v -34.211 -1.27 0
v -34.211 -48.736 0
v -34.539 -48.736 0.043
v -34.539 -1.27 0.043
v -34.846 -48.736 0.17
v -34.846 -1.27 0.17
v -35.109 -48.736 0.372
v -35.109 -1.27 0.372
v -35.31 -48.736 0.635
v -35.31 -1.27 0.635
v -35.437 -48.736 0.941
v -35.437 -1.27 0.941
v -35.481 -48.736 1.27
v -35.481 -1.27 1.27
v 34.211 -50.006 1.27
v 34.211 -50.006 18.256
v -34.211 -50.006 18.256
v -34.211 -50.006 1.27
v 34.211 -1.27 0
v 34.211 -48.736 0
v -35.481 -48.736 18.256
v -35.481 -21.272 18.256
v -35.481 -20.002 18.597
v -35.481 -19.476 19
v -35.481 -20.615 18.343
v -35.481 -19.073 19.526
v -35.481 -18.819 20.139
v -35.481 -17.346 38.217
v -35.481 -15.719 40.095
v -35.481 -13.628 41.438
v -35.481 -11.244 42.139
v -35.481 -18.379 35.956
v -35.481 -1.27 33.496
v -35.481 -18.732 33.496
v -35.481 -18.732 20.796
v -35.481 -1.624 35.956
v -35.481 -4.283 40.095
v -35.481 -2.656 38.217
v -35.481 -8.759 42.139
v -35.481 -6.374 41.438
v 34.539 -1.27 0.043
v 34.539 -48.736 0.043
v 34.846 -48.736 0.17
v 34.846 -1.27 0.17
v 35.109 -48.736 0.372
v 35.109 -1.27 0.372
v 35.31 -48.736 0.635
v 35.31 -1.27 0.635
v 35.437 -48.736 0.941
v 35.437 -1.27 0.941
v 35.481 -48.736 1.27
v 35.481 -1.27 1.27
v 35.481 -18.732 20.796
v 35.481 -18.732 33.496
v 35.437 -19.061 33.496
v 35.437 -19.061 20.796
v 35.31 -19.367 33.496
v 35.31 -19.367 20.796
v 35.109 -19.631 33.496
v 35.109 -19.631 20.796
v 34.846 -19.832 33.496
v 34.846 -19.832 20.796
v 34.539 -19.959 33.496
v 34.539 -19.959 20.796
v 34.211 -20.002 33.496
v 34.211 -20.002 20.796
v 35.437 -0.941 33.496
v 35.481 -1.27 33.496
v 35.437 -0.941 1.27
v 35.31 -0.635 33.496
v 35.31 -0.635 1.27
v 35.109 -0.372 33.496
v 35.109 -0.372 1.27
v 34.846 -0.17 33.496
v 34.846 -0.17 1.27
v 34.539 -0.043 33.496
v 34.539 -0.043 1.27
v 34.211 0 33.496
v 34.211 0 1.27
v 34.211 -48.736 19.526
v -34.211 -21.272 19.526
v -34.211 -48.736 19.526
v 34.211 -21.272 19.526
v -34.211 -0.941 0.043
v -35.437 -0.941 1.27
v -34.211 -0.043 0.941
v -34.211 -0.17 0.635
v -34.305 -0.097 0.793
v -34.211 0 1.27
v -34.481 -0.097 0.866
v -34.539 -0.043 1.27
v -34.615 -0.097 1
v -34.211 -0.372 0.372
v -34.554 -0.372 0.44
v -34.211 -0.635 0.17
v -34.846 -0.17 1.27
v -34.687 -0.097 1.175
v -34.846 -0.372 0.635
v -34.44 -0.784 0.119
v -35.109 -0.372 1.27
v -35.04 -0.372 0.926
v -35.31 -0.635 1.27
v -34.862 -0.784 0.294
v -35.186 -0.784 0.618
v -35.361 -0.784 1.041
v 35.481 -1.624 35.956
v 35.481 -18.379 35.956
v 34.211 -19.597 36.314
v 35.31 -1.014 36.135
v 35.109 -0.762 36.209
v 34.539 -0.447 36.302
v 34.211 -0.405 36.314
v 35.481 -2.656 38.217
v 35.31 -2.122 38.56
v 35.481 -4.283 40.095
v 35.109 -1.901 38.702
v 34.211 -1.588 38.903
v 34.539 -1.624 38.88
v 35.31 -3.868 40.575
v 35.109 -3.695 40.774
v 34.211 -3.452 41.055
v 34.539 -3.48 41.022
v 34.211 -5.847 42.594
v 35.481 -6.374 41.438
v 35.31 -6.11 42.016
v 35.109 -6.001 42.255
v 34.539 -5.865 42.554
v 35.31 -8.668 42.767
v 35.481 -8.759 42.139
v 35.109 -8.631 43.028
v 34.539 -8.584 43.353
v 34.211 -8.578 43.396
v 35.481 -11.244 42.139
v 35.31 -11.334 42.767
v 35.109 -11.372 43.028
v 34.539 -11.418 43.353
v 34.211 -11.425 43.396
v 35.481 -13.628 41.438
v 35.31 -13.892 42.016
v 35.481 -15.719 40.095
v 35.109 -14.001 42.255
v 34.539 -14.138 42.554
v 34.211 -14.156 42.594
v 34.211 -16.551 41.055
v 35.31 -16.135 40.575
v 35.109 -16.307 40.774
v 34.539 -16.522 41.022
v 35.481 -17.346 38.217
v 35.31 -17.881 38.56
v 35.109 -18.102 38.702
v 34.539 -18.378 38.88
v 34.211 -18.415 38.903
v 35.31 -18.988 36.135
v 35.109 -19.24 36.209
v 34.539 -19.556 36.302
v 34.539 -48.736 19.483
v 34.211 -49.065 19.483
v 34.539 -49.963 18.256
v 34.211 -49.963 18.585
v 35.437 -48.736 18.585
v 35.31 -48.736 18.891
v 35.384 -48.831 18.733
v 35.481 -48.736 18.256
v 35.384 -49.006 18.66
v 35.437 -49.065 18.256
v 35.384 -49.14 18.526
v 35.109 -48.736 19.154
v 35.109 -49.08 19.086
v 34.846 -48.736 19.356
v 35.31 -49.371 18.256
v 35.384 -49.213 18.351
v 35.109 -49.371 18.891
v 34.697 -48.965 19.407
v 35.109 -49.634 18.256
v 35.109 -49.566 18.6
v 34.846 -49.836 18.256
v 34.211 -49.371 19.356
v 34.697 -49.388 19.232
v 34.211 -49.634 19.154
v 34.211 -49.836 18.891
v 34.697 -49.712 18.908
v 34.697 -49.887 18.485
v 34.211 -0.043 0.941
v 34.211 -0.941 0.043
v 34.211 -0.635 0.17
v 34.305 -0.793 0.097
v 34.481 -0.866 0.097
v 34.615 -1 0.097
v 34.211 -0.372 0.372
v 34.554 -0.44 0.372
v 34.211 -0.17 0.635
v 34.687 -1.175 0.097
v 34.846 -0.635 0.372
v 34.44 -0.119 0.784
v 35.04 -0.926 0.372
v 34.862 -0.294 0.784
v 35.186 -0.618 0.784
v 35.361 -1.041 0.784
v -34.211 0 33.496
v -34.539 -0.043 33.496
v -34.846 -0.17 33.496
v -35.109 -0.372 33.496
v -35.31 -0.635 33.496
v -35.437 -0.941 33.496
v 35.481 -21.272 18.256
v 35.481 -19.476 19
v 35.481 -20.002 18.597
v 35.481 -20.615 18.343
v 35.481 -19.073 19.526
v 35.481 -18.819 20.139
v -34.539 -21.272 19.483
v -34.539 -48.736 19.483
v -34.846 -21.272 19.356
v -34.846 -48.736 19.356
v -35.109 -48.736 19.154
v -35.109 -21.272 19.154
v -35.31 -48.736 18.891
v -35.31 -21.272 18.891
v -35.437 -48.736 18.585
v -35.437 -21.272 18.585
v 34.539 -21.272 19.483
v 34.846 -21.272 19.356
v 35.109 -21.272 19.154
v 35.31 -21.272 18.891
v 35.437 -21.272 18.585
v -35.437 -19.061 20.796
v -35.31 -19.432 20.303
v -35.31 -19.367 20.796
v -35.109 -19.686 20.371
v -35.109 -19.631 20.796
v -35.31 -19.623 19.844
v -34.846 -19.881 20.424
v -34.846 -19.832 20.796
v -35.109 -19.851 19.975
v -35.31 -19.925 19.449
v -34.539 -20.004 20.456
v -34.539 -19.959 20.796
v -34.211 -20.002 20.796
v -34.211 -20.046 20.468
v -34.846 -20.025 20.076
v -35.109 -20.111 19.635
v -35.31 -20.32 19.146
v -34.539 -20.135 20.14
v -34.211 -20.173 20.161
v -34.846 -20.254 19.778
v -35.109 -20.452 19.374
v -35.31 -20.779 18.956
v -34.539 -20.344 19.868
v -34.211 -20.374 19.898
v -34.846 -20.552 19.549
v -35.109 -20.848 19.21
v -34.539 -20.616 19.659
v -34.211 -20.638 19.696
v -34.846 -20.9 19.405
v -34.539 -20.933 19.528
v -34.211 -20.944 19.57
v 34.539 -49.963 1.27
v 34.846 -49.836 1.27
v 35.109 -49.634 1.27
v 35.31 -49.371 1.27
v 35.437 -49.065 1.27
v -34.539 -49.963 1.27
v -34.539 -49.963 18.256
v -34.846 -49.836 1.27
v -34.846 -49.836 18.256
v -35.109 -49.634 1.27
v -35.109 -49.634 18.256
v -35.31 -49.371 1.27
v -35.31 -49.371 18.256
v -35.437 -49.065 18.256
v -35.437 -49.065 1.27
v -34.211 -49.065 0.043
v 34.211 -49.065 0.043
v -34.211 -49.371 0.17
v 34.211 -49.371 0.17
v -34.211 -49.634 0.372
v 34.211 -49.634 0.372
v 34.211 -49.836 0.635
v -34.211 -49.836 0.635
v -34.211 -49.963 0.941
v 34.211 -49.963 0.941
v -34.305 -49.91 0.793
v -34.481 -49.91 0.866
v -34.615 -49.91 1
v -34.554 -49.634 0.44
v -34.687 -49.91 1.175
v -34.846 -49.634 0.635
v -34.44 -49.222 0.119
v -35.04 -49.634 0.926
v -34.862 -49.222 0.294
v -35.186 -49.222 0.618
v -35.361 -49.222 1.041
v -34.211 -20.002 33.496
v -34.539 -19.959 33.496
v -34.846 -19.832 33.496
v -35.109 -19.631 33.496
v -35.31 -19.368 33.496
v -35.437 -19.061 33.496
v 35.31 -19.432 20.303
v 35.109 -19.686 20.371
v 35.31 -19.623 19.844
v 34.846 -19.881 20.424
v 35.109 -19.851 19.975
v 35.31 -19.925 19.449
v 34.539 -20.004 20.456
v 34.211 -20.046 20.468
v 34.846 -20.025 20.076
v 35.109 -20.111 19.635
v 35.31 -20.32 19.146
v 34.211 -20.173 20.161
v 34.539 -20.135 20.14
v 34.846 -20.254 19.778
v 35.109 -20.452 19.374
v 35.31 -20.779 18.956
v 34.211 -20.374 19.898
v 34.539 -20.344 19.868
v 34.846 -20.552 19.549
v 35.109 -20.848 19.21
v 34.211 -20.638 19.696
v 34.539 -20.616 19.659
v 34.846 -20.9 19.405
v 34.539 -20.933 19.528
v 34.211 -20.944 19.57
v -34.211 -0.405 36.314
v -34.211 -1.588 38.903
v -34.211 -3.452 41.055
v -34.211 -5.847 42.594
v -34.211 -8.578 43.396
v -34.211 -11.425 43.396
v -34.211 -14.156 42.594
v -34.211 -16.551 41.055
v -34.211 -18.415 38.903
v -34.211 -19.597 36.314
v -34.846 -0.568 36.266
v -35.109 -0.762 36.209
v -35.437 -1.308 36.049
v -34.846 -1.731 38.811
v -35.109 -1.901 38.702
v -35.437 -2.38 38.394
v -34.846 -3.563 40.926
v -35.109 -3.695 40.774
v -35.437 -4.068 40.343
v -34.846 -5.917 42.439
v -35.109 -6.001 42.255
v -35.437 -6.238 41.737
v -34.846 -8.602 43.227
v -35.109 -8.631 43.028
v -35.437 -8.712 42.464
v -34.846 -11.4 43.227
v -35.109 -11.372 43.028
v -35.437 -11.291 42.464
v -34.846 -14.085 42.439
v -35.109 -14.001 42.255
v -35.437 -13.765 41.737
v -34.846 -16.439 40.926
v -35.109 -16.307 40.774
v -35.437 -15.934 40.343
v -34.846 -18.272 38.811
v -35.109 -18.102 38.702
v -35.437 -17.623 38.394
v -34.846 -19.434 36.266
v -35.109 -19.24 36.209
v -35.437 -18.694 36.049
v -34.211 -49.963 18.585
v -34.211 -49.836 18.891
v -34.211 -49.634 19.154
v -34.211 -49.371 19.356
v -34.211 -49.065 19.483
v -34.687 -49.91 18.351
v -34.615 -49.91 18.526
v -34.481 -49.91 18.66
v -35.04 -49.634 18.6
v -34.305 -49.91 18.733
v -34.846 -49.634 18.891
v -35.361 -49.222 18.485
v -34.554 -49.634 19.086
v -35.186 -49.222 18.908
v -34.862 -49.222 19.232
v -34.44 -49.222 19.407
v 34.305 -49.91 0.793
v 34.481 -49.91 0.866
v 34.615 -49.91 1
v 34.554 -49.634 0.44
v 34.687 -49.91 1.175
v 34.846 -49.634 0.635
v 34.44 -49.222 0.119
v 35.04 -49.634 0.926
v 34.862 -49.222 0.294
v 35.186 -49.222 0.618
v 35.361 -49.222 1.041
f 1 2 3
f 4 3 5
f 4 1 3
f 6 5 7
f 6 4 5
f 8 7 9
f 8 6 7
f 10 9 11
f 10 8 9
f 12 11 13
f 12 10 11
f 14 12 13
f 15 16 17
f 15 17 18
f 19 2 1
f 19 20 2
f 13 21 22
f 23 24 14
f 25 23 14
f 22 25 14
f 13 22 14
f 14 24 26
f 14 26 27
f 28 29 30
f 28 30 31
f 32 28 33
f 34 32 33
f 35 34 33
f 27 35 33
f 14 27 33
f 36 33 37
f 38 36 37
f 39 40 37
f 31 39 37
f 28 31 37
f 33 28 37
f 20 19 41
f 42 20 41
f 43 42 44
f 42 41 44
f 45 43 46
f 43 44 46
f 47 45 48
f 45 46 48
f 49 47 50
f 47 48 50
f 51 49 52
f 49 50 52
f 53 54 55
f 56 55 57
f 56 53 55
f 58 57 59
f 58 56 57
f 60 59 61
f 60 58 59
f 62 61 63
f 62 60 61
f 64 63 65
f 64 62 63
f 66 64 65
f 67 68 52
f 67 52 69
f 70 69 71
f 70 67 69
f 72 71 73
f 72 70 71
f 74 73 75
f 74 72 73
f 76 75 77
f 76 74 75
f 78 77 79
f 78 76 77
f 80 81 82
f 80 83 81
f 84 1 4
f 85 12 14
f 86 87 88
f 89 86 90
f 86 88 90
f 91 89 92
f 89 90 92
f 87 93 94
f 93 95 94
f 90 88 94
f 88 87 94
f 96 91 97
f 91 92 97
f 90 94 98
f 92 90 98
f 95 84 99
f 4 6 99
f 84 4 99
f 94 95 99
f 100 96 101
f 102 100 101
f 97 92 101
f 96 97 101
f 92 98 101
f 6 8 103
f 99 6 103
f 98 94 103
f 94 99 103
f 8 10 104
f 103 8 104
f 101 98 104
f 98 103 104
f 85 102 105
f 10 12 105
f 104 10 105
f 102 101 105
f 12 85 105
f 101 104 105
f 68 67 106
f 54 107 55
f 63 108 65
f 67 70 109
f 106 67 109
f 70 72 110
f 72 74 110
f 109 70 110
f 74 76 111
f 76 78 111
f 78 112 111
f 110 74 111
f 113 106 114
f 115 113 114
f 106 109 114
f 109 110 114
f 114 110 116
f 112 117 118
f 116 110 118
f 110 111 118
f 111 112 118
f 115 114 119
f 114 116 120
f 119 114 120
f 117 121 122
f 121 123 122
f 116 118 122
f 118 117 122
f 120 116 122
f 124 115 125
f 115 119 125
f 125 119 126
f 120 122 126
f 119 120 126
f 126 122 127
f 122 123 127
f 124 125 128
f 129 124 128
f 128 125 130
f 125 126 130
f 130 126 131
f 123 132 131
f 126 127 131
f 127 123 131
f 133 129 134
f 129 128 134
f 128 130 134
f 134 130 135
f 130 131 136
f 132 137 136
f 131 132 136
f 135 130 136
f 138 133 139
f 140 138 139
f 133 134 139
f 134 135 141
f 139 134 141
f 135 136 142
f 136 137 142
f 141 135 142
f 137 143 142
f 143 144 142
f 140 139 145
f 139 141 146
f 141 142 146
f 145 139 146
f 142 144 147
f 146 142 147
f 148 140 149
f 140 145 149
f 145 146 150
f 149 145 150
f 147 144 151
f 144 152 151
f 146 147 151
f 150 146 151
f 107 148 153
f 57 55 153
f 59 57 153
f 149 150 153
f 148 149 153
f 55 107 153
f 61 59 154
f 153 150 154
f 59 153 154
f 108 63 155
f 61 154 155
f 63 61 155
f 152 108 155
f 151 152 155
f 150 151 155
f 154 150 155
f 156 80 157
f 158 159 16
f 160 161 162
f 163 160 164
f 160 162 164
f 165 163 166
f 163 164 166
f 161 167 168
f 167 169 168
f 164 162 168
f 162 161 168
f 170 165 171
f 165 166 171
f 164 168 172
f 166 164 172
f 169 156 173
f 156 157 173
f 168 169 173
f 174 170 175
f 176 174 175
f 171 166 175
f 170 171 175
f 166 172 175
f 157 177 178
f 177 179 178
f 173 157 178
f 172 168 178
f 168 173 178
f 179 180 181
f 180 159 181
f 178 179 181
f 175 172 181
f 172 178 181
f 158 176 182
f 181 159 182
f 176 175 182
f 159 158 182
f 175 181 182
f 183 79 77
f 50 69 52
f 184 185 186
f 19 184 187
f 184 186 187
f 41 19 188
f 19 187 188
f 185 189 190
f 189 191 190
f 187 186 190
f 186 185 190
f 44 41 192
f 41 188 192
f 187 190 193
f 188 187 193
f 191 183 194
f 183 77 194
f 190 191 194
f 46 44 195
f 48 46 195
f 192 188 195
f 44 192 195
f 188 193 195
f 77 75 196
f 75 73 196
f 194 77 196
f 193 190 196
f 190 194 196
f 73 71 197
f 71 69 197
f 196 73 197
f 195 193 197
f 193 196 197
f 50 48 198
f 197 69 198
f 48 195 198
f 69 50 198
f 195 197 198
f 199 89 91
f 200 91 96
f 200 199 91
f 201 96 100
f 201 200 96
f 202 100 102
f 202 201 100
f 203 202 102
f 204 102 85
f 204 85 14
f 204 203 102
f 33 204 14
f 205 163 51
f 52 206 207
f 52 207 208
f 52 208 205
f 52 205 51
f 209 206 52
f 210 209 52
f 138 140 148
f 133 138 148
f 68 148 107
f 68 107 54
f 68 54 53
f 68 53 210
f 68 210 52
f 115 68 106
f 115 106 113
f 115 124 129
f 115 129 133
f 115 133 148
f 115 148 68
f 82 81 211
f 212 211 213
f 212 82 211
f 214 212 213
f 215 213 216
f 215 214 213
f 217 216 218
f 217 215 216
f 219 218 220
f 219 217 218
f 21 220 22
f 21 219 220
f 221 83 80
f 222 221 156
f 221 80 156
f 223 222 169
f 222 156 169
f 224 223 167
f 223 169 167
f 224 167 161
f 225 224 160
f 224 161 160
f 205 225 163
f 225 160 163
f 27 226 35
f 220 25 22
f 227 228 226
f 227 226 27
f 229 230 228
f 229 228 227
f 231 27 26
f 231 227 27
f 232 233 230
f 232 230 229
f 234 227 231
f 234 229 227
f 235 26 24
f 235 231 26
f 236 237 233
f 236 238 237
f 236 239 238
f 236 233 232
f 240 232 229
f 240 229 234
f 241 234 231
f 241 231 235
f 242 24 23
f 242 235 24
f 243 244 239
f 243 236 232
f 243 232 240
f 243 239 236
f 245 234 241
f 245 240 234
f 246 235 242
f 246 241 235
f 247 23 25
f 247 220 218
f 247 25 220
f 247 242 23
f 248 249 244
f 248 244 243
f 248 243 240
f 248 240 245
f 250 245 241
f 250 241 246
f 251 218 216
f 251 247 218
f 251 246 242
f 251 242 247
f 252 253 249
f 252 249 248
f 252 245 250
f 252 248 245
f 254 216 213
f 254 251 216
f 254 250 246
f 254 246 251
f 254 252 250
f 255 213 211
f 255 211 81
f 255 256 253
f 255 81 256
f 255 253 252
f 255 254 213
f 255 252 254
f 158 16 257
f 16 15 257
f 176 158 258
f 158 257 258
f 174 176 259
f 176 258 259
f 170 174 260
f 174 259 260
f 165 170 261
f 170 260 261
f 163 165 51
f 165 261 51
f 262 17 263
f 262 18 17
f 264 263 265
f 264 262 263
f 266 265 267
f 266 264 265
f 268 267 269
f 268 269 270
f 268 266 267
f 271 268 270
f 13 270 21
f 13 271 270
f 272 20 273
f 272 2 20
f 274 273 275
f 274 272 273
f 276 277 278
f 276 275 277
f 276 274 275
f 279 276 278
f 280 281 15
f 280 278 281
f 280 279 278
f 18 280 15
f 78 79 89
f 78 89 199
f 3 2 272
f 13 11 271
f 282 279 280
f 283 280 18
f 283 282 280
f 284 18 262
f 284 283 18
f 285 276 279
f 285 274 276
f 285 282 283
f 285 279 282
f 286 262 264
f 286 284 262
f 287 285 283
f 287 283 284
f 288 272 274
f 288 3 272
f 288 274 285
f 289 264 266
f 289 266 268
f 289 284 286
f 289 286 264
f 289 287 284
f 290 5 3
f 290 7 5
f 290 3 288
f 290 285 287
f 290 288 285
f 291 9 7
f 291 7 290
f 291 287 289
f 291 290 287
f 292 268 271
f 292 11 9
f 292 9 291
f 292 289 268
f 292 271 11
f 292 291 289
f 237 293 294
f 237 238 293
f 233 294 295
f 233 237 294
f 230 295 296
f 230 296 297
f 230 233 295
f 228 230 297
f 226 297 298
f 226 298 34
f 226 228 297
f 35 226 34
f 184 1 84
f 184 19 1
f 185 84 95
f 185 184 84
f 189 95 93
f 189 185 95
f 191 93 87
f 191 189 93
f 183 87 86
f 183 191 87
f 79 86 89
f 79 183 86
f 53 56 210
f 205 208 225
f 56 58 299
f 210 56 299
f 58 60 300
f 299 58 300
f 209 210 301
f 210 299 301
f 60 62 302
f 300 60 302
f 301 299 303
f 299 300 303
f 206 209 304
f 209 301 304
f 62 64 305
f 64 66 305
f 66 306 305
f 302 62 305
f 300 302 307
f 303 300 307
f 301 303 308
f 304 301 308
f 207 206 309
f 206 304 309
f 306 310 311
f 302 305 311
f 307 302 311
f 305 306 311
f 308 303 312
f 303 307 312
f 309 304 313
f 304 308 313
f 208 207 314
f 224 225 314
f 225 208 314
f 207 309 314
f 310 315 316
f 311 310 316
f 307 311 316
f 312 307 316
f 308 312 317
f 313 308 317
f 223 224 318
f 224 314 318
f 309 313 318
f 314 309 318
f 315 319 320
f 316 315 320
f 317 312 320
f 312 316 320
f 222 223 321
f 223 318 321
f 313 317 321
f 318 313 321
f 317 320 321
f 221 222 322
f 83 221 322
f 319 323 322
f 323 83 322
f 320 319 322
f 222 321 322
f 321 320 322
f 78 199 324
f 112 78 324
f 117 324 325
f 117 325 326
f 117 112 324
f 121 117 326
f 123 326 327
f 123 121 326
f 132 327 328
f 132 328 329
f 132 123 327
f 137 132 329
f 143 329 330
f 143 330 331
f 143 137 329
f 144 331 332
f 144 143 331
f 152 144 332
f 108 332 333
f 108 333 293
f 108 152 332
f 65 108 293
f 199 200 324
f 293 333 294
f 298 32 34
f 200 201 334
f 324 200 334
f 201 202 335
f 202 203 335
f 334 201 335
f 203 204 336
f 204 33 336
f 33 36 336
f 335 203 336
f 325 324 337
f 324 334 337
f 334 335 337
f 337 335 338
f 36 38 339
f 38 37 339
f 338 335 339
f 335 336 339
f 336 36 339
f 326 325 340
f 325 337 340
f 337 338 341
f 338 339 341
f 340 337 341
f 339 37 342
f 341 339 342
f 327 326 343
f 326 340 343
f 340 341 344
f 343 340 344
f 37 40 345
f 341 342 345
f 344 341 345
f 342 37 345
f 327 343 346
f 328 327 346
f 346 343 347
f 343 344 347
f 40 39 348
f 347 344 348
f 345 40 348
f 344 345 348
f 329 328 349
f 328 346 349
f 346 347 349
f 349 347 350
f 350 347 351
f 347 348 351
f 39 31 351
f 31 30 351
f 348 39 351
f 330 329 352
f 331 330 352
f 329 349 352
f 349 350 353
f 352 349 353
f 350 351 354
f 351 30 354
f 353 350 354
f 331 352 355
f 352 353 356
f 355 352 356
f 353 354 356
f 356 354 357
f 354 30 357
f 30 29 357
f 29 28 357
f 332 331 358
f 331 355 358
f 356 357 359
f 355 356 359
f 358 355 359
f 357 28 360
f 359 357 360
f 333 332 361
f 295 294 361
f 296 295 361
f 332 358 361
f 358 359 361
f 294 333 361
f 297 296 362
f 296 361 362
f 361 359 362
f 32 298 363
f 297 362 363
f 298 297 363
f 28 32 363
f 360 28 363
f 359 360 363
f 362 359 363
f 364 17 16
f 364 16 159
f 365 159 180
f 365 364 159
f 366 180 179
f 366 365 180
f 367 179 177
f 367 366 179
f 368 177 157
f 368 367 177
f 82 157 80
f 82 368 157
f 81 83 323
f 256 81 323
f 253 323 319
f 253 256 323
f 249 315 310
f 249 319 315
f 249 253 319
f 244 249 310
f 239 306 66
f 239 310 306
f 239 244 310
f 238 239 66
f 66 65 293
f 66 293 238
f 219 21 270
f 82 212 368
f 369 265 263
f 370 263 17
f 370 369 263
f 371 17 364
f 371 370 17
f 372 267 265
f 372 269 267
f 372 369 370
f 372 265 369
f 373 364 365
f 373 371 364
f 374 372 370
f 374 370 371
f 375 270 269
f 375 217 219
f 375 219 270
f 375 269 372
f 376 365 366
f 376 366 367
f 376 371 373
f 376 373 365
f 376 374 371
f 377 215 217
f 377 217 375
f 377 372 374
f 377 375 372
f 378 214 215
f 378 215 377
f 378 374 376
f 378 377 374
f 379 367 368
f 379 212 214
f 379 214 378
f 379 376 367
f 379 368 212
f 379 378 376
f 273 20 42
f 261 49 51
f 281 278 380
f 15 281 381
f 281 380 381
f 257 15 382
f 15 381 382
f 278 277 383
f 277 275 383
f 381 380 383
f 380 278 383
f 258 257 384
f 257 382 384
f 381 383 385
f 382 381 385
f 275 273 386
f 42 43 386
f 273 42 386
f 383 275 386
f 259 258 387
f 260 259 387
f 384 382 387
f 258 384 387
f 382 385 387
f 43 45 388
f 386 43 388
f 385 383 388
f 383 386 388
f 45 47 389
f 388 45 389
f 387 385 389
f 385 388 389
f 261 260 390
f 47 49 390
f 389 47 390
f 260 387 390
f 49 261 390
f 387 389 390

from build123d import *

# Parameters (mm, degrees)
F1_DEPTH = 709.6125
F2_R     = 25.4
F3_SCALE = 0.05


with BuildPart() as f1:
    # F0 (on Right) → F1 (new body, symmetric)
    with BuildSketch(Plane.YZ):
        with BuildLine():
            Line((-1000.125, 0), (0, 0))
            Line((0, 0), (0, 669.925))
            ThreePointArc((0, 669.925), (-200.025, 869.95), (-400.05, 669.925))
            Line((-400.05, 669.925), (-400.05, 390.525))
            Line((-400.05, 390.525), (-1000.125, 390.525))
            Line((-1000.125, 390.525), (-1000.125, 0))
        make_face()
    extrude(amount=F1_DEPTH, both=True)

    # F2
    f2_edges = [f1.edges().sort_by_distance(p)[0] for p in [
        (709.6125, 0, 334.9625),
        (-709.6125, -500.0625, 0),
        (0, 0, 0),
        (709.6125, -500.0625, 0),
        (0, -1000.125, 0),
        (-709.6125, 0, 334.9625),
        (-709.6125, -200.025, 869.95),
        (-709.6125, -400.05, 530.225),
        (-709.6125, -700.0875, 390.525),
        (-709.6125, -1000.125, 195.2625),
        (0, -1000.125, 390.525),
        (709.6125, -200.025, 869.95),
        (709.6125, -400.05, 530.225),
        (709.6125, -700.0875, 390.525),
        (709.6125, -1000.125, 195.2625),
        (0, -400.05, 390.525),
        (0, -400.05, 669.925),
        (0, 0, 669.925),
    ]]
    fillet(f2_edges, radius=F2_R)


with BuildPart() as f1_1:
    # F3: moved
    add(f1.part.scale(F3_SCALE))


solid = f1_1.part
